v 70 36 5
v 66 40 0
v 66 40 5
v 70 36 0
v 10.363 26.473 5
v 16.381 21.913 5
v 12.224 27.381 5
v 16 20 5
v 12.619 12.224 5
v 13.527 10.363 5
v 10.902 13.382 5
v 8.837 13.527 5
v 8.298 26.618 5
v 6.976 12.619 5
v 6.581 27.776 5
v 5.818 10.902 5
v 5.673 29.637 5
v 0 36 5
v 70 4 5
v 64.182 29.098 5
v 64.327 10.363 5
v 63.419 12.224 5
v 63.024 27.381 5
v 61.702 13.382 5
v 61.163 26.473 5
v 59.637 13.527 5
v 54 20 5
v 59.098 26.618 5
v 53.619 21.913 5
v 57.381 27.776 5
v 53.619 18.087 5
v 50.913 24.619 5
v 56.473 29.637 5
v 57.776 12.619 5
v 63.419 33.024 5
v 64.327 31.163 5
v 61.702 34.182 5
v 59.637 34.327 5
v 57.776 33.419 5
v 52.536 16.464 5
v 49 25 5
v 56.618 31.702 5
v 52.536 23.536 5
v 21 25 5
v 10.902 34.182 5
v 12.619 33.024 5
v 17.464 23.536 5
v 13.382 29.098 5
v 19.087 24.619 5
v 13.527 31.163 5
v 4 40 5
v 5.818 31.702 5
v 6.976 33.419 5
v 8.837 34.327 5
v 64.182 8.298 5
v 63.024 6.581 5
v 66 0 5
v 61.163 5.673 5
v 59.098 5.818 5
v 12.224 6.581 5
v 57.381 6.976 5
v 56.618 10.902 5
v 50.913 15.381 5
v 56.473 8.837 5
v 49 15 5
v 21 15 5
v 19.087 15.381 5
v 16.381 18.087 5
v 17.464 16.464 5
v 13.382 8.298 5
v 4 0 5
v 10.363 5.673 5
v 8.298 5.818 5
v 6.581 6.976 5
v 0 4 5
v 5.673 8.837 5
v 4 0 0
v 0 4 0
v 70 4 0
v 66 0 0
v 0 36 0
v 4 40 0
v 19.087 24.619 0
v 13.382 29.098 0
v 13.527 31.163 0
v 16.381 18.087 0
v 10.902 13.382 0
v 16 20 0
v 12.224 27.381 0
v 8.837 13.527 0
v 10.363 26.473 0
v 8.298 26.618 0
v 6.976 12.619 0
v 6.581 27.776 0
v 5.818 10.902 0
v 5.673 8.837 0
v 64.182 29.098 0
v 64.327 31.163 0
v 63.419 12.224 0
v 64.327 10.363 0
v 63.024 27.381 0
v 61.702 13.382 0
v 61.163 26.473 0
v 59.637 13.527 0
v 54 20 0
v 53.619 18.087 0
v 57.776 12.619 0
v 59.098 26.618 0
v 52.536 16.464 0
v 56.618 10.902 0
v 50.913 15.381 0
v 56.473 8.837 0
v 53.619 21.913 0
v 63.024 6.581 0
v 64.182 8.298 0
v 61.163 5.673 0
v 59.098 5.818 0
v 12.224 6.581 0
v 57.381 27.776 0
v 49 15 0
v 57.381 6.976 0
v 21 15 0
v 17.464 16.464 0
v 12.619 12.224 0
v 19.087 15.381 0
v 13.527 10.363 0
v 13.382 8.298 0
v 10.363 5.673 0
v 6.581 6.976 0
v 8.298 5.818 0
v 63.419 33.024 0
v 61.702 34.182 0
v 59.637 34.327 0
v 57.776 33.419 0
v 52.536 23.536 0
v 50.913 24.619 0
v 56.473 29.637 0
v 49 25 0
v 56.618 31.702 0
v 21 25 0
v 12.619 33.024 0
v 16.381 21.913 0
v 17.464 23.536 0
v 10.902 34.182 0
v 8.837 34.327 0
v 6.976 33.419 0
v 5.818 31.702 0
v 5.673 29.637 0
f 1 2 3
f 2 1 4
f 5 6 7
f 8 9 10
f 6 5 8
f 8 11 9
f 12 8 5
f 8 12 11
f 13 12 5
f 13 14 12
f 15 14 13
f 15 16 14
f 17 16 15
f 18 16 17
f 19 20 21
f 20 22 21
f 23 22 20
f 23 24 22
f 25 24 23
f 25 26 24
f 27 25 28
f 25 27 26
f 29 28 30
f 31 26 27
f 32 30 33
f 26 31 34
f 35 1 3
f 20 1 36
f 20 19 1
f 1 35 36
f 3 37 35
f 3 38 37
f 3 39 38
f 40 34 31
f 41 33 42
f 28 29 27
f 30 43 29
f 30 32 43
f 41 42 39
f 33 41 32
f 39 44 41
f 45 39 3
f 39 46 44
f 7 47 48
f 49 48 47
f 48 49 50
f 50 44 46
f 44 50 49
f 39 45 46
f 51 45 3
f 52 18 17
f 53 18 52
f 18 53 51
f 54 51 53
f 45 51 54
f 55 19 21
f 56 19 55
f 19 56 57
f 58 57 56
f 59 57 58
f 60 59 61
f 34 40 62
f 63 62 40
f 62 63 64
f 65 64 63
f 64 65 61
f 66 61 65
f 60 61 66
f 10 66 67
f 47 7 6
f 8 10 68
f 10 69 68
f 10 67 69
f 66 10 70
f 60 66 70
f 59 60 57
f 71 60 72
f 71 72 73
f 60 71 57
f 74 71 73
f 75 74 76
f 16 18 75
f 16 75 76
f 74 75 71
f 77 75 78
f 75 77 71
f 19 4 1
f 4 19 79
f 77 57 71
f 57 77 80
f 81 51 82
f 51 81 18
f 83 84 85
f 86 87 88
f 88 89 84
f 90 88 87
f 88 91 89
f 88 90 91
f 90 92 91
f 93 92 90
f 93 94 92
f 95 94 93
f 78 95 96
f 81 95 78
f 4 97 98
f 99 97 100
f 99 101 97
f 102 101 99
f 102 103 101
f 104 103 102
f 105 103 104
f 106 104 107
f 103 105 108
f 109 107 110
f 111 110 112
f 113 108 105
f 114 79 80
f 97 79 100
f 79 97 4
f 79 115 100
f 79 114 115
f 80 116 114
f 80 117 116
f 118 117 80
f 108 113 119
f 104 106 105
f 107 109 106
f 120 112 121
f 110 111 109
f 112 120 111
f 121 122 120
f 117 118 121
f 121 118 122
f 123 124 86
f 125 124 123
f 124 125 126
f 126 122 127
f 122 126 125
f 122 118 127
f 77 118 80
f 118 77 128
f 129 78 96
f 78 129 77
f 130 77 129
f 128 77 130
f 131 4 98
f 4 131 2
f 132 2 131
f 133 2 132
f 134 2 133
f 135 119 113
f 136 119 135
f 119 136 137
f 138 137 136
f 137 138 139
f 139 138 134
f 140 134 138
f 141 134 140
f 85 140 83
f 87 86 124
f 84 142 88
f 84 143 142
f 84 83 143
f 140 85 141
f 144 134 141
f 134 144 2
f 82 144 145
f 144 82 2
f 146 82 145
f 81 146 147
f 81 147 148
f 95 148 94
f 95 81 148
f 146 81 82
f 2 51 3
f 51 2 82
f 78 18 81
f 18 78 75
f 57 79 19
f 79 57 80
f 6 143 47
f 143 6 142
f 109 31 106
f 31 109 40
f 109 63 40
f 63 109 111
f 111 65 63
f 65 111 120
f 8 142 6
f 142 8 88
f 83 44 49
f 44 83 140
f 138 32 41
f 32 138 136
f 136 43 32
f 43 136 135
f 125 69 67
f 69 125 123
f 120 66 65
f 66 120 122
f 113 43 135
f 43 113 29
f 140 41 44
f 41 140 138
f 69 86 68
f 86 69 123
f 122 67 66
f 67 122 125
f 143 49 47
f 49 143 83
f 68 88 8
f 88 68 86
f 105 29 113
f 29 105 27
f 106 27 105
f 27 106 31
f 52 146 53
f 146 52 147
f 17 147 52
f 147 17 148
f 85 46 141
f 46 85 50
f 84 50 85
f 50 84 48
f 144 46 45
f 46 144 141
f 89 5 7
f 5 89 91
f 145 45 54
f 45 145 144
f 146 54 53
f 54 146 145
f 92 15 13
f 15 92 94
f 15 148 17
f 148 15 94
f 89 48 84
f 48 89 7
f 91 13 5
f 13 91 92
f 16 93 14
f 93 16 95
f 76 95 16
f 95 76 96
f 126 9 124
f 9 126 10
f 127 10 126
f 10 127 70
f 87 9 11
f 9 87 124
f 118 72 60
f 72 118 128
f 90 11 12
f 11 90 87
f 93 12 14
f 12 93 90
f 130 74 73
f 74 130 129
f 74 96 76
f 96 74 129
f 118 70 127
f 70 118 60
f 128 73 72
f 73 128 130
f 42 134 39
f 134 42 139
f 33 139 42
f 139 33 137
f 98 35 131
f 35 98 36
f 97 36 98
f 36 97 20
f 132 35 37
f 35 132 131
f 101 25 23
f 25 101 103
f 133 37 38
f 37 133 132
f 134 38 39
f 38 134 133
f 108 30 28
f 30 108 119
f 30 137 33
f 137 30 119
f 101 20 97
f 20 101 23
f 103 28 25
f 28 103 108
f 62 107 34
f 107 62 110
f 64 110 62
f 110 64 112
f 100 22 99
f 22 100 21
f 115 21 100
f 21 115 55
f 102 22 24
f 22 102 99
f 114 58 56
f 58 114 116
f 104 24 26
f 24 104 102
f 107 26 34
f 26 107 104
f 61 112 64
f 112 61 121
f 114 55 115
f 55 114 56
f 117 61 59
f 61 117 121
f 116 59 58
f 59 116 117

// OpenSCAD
$fn = 32;

// ----------------------------------------------------------------------
// Bracket plate: slot plate 70 x 40
// ----------------------------------------------------------------------

// --- parameters (mm) ---
hole_r = 4;               // bolt hole radius
plate_t = 5;              // plate thickness, Z (extrusion height)
plate_l = 70;             // plate length
plate_w = 40;             // plate width
slot_l = 28;              // slot straight length
slot_r = 5;               // slot end radius

slot_len = slot_l + 2 * slot_r;
slot_w = 2 * slot_r;
hole_d2 = 2 * hole_r;

profile = [[4, 0], [66, 0], [70, 4], [70, 36], [66, 40], [4, 40], [0, 36], [0, 4]];  // primary outline, 8 points, counter clockwise
void_1 = [[49, 15], [50.913, 15.381], [52.536, 16.464], [53.619, 18.087], [54, 20], [53.619, 21.913], [52.536, 23.536], [50.913, 24.619], [49, 25], [21, 25], [19.087, 24.619], [17.464, 23.536], [16.381, 21.913], [16, 20], [16.381, 18.087], [17.464, 16.464], [19.087, 15.381], [21, 15]];  // grip slot, 18 points
void_2 = [[13.527, 31.163], [12.619, 33.024], [10.902, 34.182], [8.837, 34.327], [6.976, 33.419], [5.818, 31.702], [5.673, 29.637], [6.581, 27.776], [8.298, 26.618], [10.363, 26.473], [12.224, 27.381], [13.382, 29.098]];  // corner hole, 12 points
void_3 = [[13.527, 10.363], [12.619, 12.224], [10.902, 13.382], [8.837, 13.527], [6.976, 12.619], [5.818, 10.902], [5.673, 8.837], [6.581, 6.976], [8.298, 5.818], [10.363, 5.673], [12.224, 6.581], [13.382, 8.298]];  // corner hole, 12 points
void_4 = [[64.327, 31.163], [63.419, 33.024], [61.702, 34.182], [59.637, 34.327], [57.776, 33.419], [56.618, 31.702], [56.473, 29.637], [57.381, 27.776], [59.098, 26.618], [61.163, 26.473], [63.024, 27.381], [64.182, 29.098]];  // corner hole, 12 points
void_5 = [[64.327, 10.363], [63.419, 12.224], [61.702, 13.382], [59.637, 13.527], [57.776, 12.619], [56.618, 10.902], [56.473, 8.837], [57.381, 6.976], [59.098, 5.818], [61.163, 5.673], [63.024, 6.581], [64.182, 8.298]];  // corner hole, 12 points

// --- the one profile operation ---
difference() {
  linear_extrude(height = plate_t) polygon(points = profile);
  translate([0, 0, -1])
    linear_extrude(height = plate_t + 2) polygon(points = void_1);
  translate([0, 0, -1])
    linear_extrude(height = plate_t + 2) polygon(points = void_2);
  translate([0, 0, -1])
    linear_extrude(height = plate_t + 2) polygon(points = void_3);
  translate([0, 0, -1])
    linear_extrude(height = plate_t + 2) polygon(points = void_4);
  translate([0, 0, -1])
    linear_extrude(height = plate_t + 2) polygon(points = void_5);
}
